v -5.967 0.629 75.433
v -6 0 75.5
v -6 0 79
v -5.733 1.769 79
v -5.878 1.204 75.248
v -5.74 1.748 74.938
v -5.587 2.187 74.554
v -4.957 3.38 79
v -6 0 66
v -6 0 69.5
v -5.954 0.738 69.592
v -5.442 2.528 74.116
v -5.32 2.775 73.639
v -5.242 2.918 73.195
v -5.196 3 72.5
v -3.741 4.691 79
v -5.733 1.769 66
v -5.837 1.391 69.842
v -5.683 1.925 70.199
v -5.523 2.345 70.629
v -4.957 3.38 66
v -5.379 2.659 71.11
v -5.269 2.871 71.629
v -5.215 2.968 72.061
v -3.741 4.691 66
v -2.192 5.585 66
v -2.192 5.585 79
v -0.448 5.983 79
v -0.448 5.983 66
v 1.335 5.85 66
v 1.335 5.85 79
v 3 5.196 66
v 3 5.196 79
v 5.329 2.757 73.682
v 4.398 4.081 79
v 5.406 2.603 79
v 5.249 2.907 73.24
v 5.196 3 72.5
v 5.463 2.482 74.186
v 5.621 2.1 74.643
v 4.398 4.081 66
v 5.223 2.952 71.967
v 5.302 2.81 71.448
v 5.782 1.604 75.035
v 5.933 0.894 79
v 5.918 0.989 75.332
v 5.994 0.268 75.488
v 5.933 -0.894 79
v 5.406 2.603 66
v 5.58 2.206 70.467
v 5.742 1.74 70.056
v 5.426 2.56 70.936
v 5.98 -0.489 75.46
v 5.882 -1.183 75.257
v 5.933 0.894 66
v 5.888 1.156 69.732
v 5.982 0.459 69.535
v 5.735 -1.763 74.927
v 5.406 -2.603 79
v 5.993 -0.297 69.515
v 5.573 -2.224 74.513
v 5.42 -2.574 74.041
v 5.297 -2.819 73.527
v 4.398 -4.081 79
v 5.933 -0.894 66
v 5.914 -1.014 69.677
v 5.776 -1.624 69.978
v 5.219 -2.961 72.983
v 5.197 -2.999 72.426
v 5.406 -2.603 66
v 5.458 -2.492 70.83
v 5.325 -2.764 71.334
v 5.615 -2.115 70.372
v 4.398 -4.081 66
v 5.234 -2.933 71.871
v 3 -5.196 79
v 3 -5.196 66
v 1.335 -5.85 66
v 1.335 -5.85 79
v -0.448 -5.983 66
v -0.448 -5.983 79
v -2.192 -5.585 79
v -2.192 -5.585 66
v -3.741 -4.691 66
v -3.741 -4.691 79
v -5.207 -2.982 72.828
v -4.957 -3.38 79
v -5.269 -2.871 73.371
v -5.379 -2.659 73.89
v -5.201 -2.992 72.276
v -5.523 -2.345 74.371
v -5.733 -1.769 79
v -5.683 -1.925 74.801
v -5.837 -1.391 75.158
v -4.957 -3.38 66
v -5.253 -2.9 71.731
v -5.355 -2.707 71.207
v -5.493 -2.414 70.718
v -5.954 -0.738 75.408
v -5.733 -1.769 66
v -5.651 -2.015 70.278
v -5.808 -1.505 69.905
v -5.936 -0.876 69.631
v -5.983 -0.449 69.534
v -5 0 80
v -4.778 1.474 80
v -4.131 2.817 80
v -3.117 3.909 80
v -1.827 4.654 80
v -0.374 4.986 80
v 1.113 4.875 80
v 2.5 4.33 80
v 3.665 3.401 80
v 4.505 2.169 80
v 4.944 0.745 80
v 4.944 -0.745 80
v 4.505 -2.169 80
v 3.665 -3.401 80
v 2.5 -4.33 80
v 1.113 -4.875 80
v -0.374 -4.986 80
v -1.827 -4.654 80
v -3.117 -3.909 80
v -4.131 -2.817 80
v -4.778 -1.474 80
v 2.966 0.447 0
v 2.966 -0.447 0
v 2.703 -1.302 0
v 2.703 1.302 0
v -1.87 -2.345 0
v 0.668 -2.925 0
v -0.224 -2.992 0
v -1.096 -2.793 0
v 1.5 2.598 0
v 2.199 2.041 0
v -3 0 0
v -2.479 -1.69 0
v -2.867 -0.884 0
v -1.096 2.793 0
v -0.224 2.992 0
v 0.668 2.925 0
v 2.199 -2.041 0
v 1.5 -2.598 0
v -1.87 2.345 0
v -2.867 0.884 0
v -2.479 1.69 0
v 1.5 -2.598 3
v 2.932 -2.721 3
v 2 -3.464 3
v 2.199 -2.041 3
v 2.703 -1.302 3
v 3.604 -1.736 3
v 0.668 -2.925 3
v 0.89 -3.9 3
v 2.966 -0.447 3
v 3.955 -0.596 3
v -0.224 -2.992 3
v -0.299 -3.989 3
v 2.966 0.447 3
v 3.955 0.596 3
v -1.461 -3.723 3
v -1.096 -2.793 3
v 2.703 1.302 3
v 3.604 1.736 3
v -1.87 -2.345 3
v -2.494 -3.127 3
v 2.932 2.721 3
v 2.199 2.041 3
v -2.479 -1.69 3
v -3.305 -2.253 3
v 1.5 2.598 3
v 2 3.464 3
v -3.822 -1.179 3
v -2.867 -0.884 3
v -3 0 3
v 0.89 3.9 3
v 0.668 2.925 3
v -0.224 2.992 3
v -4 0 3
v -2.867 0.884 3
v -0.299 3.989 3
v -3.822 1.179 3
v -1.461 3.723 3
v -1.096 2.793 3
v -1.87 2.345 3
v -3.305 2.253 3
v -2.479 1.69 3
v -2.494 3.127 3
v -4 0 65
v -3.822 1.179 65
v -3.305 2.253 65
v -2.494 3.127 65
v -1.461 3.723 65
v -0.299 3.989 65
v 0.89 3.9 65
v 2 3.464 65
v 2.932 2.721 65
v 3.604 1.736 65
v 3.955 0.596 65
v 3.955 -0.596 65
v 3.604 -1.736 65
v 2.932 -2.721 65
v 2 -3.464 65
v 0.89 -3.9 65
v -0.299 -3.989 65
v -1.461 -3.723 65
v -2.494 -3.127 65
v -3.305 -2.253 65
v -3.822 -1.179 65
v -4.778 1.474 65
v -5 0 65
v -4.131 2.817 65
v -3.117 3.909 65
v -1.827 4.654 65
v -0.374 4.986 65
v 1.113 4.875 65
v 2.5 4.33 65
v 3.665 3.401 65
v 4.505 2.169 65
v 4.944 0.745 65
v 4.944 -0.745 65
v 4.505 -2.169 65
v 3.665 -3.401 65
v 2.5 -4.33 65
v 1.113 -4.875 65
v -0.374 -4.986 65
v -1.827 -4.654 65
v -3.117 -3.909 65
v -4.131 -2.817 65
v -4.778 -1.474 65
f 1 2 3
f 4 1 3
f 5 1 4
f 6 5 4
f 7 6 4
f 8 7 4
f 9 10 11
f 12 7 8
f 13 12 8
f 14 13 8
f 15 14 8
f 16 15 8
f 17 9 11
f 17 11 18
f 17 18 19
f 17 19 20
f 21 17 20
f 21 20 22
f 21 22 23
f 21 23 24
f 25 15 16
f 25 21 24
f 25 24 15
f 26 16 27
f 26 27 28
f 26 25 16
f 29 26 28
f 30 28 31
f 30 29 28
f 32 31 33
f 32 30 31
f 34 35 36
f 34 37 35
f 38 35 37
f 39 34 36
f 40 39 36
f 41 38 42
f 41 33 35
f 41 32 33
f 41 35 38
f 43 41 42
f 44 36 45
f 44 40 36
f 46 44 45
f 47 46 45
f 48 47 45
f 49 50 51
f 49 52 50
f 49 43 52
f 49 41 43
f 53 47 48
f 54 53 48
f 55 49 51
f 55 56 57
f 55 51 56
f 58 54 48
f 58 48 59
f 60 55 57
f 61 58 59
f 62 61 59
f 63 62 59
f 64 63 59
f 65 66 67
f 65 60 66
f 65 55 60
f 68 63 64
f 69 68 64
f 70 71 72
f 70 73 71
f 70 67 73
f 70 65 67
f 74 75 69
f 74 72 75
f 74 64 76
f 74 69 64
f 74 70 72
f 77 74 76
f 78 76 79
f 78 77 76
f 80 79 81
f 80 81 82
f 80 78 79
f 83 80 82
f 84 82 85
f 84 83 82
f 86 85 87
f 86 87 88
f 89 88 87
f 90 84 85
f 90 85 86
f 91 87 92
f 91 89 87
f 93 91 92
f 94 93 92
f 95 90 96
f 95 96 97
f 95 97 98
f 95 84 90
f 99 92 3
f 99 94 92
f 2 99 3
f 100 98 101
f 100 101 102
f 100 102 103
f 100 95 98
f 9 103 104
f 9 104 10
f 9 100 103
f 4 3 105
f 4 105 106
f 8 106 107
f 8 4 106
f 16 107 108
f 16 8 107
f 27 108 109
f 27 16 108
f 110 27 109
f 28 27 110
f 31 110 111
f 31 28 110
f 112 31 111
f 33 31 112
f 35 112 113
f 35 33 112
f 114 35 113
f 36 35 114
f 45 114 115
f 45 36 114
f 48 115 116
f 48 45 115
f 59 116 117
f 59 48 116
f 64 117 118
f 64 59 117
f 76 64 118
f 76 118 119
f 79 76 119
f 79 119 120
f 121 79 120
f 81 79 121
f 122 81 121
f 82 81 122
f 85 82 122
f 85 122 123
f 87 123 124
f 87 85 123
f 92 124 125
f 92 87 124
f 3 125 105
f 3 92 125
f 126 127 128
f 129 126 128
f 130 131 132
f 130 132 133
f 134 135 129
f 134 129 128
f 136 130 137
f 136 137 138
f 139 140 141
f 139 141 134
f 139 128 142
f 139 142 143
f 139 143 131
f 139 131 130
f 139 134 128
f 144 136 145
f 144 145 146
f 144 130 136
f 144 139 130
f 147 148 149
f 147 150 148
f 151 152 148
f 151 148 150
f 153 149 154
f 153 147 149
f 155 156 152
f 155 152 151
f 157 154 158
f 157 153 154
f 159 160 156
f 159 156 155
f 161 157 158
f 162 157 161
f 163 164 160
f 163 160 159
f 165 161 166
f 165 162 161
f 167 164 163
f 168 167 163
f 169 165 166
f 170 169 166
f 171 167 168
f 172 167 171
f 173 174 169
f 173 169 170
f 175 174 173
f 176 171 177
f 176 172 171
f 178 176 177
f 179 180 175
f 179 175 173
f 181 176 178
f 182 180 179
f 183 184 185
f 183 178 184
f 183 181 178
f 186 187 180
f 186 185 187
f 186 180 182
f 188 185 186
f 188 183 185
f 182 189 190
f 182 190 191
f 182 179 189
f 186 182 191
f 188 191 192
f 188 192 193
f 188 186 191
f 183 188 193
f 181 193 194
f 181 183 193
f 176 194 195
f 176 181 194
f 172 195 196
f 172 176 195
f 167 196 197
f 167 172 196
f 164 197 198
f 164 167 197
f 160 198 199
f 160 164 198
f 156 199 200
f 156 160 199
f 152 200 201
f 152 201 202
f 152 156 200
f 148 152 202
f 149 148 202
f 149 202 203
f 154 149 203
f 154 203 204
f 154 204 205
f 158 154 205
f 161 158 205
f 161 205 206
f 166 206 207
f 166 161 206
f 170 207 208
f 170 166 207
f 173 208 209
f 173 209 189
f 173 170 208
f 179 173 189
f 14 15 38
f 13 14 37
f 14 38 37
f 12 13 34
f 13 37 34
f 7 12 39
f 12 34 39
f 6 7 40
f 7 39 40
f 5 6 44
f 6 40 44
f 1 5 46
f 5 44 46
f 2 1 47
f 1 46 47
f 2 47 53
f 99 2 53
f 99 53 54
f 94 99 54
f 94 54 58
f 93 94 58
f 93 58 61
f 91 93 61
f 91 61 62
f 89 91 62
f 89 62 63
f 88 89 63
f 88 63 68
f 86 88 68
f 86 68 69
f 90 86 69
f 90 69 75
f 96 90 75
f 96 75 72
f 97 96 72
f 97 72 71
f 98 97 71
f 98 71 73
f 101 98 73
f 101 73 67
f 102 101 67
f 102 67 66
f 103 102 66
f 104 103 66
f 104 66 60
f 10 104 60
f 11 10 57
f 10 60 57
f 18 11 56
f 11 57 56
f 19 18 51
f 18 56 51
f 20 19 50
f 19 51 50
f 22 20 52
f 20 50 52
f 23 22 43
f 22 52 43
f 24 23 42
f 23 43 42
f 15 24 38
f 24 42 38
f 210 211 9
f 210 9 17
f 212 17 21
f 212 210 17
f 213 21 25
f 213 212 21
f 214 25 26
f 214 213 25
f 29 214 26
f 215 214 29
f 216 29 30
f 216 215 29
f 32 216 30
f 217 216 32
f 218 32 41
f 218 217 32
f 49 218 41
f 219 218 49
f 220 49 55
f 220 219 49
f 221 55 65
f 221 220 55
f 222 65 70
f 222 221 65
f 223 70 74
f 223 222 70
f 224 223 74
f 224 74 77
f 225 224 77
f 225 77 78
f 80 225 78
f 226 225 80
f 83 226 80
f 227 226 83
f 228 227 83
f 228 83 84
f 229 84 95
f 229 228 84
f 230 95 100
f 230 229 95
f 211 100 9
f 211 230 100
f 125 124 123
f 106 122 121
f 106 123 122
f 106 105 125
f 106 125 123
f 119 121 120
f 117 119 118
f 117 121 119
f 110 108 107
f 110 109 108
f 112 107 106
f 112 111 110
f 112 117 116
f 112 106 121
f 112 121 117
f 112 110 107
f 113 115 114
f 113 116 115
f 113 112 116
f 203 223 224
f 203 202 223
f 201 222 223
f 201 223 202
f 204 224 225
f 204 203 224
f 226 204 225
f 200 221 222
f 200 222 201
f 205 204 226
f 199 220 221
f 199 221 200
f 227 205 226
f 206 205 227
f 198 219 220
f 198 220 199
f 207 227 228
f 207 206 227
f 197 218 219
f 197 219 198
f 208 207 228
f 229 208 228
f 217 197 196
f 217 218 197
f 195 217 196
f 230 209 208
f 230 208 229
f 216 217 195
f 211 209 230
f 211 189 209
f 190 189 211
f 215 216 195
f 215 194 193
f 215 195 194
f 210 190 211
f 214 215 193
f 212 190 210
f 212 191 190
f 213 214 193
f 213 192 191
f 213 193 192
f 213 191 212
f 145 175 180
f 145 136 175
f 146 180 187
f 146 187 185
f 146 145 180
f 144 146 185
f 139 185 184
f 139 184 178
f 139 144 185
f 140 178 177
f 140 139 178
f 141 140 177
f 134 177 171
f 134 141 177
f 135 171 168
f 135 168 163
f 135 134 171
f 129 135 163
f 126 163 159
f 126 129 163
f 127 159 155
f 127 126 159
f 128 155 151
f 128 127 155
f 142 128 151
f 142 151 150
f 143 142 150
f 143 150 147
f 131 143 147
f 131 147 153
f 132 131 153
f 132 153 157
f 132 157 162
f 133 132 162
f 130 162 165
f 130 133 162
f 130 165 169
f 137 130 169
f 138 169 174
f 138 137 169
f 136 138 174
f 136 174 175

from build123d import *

# Parameters (mm, degrees)
F2_SIZE2 = 1
F2_SIZE  = 1
F3_R     = 3
F4_DEPTH = 12.5


with BuildPart() as f1:
    # F0 (on Front) → F1 (revolve)
    with BuildSketch(Plane.XZ):
        Polygon((-4, 65), (-4, 3), (-3, 3), (-3, 0), (0, 0), (0, 80), (-6, 80), (-6, 65), align=None)
    revolve(axis=Axis((0, 0, 40), (0, 0, -1)))

    # F2
    f2_edges = [f1.edges().sort_by_distance(p)[0] for p in [
        (6, 0, 80),
        (6, 0, 65),
    ]]
    chamfer(f2_edges, length=F2_SIZE, length2=F2_SIZE2)

    # F3 (on Right) → F4 (cut, symmetric)
    with BuildSketch(Plane.YZ):
        with Locations((0, 72.5)):
            Circle(F3_R)
    extrude(amount=F4_DEPTH, both=True, mode=Mode.SUBTRACT)


solid = f1.part
